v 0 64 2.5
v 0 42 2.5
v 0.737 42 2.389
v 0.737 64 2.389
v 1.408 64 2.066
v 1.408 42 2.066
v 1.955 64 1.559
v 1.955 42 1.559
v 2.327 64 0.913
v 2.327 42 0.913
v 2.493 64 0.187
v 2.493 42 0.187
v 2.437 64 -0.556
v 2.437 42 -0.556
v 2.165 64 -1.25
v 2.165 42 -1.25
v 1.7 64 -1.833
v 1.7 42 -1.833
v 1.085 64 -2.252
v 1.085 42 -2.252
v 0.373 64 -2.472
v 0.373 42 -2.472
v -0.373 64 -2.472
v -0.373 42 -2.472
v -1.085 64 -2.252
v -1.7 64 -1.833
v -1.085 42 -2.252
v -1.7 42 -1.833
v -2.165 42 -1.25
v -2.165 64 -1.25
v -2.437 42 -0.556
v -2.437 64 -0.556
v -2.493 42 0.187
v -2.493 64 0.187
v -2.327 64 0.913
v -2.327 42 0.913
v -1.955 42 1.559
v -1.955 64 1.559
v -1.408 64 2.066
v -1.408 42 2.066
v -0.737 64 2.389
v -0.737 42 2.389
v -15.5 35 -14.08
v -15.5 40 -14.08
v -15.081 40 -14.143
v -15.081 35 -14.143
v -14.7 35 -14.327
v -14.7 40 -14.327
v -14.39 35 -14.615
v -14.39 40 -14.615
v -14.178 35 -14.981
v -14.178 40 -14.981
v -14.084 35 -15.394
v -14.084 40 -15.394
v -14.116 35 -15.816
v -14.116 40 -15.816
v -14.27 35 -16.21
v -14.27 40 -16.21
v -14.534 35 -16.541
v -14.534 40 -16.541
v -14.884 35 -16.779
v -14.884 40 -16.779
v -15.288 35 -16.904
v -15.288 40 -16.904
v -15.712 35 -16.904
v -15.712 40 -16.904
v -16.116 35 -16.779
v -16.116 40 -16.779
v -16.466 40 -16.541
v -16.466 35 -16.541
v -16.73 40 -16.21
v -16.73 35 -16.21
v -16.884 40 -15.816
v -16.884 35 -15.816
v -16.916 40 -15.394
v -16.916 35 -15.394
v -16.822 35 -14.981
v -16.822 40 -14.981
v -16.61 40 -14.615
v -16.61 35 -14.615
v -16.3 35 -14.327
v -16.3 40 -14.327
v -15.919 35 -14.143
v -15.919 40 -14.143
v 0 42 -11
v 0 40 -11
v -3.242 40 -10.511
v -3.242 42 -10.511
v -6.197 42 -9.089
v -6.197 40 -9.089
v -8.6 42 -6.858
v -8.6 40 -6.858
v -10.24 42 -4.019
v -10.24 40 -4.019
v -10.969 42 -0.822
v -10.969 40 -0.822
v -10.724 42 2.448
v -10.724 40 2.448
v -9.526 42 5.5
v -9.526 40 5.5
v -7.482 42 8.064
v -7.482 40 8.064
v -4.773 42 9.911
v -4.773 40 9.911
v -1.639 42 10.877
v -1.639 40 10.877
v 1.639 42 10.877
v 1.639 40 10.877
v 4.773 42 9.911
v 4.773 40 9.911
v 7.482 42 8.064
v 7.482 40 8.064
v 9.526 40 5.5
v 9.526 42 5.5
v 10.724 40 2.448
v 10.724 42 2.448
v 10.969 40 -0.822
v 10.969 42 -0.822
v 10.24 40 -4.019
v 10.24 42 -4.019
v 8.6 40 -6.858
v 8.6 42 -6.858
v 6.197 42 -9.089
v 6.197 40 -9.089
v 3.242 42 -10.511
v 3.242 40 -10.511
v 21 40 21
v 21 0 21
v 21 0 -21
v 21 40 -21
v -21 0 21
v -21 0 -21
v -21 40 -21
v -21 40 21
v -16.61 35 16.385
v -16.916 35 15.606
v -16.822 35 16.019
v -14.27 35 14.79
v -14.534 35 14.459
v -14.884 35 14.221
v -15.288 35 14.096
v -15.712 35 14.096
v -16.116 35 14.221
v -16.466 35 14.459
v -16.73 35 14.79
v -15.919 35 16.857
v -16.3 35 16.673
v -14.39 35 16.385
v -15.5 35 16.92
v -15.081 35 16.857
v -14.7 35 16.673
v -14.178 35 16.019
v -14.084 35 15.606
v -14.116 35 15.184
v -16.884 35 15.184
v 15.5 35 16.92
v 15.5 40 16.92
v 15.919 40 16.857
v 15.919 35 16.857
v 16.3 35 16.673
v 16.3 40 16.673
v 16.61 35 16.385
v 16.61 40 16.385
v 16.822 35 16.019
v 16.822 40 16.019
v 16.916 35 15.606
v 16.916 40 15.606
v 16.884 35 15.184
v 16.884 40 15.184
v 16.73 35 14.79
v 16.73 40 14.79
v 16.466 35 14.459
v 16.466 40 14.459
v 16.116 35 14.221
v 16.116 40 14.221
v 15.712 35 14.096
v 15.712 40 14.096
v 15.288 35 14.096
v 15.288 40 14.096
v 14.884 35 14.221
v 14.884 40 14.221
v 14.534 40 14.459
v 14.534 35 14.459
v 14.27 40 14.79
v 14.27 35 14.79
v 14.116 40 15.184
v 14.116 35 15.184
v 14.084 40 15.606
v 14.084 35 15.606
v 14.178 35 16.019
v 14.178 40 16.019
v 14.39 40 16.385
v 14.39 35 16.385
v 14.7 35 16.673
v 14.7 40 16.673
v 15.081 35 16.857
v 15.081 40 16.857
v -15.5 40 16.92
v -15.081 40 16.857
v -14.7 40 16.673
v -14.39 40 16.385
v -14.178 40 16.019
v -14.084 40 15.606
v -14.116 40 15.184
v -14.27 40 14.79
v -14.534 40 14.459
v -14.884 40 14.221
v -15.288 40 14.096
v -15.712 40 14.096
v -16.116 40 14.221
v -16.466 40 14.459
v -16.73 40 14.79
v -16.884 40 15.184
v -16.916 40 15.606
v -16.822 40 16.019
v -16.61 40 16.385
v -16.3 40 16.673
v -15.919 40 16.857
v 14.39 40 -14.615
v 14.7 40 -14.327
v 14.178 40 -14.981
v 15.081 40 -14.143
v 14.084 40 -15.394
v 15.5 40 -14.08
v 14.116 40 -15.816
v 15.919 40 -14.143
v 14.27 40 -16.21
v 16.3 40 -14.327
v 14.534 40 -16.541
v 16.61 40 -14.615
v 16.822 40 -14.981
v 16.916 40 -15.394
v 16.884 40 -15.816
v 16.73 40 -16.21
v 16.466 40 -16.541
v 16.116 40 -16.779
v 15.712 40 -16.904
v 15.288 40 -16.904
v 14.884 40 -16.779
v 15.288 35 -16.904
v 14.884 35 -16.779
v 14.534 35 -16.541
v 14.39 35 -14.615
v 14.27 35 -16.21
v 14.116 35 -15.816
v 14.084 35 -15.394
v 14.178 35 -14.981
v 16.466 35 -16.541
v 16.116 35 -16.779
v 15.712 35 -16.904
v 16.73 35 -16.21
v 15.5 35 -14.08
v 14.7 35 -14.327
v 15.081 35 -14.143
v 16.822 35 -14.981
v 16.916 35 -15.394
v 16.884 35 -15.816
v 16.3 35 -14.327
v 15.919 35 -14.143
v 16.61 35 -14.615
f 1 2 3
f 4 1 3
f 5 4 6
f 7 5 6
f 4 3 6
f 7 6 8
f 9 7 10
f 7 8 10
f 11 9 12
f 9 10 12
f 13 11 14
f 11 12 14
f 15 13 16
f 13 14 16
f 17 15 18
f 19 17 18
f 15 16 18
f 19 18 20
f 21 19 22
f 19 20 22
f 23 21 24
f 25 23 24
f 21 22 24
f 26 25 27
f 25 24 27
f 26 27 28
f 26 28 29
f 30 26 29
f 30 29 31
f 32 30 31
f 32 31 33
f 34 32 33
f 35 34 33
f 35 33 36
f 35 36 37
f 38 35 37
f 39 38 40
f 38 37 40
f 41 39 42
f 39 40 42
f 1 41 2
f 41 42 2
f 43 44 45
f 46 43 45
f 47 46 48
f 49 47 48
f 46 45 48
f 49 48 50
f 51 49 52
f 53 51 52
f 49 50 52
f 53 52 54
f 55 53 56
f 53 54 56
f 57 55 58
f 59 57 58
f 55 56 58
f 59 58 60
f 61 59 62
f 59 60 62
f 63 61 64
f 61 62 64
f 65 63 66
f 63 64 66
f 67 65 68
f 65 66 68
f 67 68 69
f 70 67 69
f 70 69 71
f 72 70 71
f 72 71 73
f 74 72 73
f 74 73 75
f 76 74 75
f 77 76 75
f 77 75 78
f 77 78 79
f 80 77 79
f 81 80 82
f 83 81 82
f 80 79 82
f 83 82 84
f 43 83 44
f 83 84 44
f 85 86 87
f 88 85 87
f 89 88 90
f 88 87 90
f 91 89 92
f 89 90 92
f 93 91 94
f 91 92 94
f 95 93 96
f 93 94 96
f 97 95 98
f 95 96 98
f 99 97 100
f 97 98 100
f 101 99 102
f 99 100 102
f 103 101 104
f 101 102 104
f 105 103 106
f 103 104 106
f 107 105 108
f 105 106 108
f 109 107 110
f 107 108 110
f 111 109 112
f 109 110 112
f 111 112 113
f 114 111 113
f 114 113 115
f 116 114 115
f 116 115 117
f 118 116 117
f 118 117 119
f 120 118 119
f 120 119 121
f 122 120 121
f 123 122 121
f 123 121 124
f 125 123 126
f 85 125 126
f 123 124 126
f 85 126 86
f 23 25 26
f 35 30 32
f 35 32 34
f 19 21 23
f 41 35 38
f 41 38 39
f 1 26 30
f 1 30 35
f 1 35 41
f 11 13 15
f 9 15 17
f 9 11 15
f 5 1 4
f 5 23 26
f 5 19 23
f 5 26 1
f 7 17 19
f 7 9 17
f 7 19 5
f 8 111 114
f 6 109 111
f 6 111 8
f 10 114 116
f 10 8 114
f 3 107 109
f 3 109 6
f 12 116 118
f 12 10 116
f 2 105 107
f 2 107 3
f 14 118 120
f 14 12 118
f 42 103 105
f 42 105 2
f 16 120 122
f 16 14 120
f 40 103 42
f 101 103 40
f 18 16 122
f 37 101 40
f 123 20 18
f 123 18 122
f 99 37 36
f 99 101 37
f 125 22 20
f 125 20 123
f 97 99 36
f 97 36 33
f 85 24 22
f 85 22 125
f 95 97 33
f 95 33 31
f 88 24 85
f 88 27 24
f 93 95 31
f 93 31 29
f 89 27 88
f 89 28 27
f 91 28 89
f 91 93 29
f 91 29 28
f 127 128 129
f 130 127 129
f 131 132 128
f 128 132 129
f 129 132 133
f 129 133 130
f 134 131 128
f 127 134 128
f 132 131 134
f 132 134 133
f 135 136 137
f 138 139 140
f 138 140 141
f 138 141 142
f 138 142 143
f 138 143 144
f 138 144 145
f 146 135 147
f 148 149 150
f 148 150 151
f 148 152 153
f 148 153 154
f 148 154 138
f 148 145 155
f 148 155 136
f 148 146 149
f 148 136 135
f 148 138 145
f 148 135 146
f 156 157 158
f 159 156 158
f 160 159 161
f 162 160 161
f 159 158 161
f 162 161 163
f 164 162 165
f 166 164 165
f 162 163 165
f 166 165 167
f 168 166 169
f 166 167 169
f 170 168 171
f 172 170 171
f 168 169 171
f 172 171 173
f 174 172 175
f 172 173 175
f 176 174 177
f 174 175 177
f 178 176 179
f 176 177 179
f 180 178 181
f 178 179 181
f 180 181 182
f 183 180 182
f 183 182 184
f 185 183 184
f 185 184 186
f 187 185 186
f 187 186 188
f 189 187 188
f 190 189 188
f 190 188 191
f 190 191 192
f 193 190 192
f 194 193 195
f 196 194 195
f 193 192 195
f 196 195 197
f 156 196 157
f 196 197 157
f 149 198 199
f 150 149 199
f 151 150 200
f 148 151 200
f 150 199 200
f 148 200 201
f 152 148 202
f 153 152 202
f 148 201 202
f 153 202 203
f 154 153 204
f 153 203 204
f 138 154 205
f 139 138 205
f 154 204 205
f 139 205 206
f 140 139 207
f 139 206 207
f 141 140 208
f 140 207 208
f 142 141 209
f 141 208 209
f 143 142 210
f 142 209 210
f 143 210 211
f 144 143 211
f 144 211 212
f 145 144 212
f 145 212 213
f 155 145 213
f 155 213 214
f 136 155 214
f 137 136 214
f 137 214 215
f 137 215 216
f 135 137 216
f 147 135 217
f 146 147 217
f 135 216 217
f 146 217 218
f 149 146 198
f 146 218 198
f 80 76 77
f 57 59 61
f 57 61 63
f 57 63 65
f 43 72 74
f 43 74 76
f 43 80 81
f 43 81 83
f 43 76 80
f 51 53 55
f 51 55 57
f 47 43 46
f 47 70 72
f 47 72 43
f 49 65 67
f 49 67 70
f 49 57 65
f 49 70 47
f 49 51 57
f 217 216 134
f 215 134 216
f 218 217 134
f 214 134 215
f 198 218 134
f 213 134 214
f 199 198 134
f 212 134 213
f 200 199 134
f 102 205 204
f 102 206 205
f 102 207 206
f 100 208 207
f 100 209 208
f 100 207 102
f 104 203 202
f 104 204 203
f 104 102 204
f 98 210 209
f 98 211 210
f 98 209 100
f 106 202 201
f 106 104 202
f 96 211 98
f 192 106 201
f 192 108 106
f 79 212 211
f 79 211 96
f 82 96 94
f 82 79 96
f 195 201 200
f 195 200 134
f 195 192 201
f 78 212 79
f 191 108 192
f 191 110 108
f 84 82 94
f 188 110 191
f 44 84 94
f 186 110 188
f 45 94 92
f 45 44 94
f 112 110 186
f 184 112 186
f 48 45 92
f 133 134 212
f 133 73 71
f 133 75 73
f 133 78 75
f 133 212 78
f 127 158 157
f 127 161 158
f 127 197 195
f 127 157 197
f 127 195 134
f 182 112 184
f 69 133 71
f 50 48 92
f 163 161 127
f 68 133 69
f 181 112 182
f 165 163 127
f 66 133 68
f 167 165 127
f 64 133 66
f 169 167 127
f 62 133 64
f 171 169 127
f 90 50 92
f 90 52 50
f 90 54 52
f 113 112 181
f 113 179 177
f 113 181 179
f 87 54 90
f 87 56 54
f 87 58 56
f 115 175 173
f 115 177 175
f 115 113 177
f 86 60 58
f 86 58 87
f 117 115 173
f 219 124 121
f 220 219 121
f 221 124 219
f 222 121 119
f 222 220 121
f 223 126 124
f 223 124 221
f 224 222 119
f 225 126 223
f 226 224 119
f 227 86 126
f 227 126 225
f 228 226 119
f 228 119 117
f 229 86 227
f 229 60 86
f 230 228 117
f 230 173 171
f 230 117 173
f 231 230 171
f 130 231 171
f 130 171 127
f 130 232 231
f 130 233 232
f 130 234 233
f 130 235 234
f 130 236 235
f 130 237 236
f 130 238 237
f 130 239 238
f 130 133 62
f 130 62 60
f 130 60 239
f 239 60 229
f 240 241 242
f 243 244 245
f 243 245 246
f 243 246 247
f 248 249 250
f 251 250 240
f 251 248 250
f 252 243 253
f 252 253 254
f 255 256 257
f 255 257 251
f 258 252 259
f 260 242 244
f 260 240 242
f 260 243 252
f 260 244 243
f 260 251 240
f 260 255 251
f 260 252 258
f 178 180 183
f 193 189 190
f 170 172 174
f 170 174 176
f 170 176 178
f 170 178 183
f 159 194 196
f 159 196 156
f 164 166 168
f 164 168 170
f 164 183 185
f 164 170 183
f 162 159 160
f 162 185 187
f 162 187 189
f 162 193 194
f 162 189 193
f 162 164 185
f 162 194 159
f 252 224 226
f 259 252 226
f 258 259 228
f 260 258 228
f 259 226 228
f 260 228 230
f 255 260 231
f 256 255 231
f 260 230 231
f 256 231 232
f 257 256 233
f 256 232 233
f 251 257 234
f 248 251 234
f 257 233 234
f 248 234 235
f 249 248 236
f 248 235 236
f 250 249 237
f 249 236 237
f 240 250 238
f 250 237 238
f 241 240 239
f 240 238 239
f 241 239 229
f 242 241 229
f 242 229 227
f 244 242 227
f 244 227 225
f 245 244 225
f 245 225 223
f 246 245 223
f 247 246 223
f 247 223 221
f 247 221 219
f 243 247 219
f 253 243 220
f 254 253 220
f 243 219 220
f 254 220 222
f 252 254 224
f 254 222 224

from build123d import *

# Parameters (mm, degrees)
SKETCH1_W           = 42
SKETCH1_H           = 42
BOSS_EXTRUDE1_DEPTH = 40
SKETCH2_R           = 11
BOSS_EXTRUDE2_DEPTH = 2
SKETCH3_R           = 2.5
BOSS_EXTRUDE3_DEPTH = 22
SKETCH4_R           = 1.42
CUT_EXTRUDE1_DEPTH  = 5


with BuildPart() as part:
    # Sketch1 → Boss-Extrude1 (new body)
    with BuildSketch(Plane(origin=(0, 0, 0), x_dir=(1, 0, 0), z_dir=(0, 1, 0))):
        Rectangle(SKETCH1_W, SKETCH1_H)
    extrude(amount=BOSS_EXTRUDE1_DEPTH)

    # Sketch2 → Boss-Extrude2 (add)
    with BuildSketch(Plane(origin=(0, 40, 0), x_dir=(1, 0, 0), z_dir=(0, 1, 0))):
        with Locations(Location((0, 0, 0), (0, 0, 90))):
            Circle(SKETCH2_R)
    extrude(amount=BOSS_EXTRUDE2_DEPTH)

    # Sketch3 → Boss-Extrude3 (add)
    with BuildSketch(Plane(origin=(0, 42, 0), x_dir=(1, 0, 0), z_dir=(0, 1, 0))):
        with Locations(Location((0, 0, 0), (0, 0, 270))):
            Circle(SKETCH3_R)
    extrude(amount=BOSS_EXTRUDE3_DEPTH)

    # Sketch4 → Cut-Extrude1 (cut)
    with BuildSketch(Plane(origin=(0, 40, 0), x_dir=(1, 0, 0), z_dir=(0, 1, 0))):
        with Locations(Location((-15.5, 15.5, 0), (0, 0, 270))):
            Circle(SKETCH4_R)
        with Locations(Location((15.5, 15.5, 0), (0, 0, 270))):
            Circle(SKETCH4_R)
        with Locations(Location((15.5, -15.5, 0), (0, 0, 270))):
            Circle(SKETCH4_R)
        with Locations(Location((-15.5, -15.5, 0), (0, 0, 270))):
            Circle(SKETCH4_R)
    extrude(amount=-CUT_EXTRUDE1_DEPTH, mode=Mode.SUBTRACT)


solid = part.part
